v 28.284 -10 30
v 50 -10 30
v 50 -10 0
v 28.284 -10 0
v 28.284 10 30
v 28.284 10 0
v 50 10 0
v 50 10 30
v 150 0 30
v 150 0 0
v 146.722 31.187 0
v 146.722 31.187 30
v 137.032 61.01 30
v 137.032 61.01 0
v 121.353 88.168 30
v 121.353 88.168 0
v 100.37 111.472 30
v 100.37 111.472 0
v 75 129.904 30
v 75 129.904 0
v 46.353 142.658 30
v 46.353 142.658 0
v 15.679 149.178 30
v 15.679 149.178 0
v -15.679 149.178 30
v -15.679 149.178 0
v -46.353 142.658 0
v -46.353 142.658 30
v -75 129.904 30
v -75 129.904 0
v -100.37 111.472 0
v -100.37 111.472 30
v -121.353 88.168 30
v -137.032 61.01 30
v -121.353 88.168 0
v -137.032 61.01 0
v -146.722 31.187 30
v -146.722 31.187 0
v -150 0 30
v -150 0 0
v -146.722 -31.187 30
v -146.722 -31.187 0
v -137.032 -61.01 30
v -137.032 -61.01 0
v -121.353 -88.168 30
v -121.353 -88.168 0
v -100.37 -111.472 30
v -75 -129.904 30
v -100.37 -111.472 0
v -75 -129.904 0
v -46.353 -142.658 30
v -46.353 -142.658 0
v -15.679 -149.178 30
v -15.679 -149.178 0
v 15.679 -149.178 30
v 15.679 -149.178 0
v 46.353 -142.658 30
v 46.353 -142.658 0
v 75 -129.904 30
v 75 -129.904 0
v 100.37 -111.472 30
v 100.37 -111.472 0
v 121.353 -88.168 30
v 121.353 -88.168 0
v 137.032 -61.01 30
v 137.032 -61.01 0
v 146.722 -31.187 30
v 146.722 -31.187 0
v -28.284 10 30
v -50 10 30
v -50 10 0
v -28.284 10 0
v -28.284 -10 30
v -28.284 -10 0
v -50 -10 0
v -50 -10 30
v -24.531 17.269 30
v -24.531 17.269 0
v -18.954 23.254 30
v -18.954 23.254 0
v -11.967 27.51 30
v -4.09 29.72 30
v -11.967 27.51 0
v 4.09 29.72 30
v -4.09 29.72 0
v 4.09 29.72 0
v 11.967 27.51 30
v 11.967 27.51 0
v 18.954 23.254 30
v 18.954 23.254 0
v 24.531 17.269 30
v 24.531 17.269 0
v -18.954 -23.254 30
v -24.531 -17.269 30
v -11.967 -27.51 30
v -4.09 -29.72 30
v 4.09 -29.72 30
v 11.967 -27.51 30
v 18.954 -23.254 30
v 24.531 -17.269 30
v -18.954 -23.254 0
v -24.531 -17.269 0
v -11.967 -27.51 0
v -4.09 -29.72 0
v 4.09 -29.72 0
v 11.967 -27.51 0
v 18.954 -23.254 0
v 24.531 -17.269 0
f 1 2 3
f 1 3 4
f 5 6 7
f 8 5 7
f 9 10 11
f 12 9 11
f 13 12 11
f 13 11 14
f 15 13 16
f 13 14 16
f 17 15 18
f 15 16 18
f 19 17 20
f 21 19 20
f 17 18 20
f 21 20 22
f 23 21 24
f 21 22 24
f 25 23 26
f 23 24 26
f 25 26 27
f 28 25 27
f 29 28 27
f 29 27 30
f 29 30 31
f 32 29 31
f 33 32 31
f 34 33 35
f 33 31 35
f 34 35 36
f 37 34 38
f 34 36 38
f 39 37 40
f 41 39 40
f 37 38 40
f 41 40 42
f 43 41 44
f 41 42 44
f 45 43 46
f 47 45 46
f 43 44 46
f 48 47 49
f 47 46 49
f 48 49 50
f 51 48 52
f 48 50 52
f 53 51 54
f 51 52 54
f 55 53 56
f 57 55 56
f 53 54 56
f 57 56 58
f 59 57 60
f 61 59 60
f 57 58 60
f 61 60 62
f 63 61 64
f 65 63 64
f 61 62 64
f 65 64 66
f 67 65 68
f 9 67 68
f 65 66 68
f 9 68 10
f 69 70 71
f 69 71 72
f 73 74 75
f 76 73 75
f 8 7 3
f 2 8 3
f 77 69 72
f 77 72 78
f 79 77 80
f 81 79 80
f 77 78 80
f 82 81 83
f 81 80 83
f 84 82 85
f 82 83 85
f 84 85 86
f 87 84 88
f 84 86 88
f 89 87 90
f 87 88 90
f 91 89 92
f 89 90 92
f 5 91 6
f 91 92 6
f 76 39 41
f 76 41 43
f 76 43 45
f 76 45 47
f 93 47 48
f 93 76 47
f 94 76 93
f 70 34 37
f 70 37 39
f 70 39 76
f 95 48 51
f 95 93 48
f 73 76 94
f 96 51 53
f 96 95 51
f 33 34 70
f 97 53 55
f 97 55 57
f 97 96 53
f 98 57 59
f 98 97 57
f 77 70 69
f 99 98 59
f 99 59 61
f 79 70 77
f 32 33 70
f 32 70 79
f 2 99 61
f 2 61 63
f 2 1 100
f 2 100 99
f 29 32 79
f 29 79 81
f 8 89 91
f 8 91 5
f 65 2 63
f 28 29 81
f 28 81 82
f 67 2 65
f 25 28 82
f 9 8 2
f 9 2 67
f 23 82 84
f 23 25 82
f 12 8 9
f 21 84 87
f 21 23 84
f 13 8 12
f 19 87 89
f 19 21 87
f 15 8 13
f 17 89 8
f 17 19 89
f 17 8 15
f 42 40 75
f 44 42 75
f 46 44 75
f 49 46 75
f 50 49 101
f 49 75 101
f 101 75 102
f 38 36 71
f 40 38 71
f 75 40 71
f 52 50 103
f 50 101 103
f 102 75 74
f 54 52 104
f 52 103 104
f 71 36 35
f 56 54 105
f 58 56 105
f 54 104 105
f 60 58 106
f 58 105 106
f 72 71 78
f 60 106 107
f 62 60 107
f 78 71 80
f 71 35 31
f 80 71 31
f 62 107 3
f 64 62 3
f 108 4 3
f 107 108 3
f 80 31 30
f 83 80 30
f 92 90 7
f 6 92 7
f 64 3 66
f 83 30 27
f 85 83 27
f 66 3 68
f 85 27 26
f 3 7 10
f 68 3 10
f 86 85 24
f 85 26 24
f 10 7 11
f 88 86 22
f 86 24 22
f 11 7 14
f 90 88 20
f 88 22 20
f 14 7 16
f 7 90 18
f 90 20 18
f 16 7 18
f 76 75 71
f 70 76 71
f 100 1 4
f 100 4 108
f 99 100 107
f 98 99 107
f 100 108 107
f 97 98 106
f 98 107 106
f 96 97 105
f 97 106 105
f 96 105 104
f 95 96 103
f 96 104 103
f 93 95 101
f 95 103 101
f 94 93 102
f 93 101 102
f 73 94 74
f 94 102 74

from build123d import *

# Parameters (mm, degrees)
SKETCH1_R           = 150
BOSS_EXTRUDE1_DEPTH = 30


with BuildPart() as part:
    # Sketch1 → Boss-Extrude1 (new body)
    with BuildSketch(Plane.XY):
        Circle(SKETCH1_R)
        with BuildLine():
            Line((-50, -10), (-50, 10))
            Line((-50, 10), (-28.284271247, 10))
            ThreePointArc((-28.284271247, 10), (0, 30), (28.284271247, 10))
            Line((28.284271247, 10), (50, 10))
            Line((50, 10), (50, -10))
            Line((50, -10), (28.284271247, -10))
            ThreePointArc((28.284271247, -10), (0, -30), (-28.284271247, -10))
            Line((-28.284271247, -10), (-50, -10))
        make_face(mode=Mode.SUBTRACT)
    extrude(amount=BOSS_EXTRUDE1_DEPTH)


solid = part.part
